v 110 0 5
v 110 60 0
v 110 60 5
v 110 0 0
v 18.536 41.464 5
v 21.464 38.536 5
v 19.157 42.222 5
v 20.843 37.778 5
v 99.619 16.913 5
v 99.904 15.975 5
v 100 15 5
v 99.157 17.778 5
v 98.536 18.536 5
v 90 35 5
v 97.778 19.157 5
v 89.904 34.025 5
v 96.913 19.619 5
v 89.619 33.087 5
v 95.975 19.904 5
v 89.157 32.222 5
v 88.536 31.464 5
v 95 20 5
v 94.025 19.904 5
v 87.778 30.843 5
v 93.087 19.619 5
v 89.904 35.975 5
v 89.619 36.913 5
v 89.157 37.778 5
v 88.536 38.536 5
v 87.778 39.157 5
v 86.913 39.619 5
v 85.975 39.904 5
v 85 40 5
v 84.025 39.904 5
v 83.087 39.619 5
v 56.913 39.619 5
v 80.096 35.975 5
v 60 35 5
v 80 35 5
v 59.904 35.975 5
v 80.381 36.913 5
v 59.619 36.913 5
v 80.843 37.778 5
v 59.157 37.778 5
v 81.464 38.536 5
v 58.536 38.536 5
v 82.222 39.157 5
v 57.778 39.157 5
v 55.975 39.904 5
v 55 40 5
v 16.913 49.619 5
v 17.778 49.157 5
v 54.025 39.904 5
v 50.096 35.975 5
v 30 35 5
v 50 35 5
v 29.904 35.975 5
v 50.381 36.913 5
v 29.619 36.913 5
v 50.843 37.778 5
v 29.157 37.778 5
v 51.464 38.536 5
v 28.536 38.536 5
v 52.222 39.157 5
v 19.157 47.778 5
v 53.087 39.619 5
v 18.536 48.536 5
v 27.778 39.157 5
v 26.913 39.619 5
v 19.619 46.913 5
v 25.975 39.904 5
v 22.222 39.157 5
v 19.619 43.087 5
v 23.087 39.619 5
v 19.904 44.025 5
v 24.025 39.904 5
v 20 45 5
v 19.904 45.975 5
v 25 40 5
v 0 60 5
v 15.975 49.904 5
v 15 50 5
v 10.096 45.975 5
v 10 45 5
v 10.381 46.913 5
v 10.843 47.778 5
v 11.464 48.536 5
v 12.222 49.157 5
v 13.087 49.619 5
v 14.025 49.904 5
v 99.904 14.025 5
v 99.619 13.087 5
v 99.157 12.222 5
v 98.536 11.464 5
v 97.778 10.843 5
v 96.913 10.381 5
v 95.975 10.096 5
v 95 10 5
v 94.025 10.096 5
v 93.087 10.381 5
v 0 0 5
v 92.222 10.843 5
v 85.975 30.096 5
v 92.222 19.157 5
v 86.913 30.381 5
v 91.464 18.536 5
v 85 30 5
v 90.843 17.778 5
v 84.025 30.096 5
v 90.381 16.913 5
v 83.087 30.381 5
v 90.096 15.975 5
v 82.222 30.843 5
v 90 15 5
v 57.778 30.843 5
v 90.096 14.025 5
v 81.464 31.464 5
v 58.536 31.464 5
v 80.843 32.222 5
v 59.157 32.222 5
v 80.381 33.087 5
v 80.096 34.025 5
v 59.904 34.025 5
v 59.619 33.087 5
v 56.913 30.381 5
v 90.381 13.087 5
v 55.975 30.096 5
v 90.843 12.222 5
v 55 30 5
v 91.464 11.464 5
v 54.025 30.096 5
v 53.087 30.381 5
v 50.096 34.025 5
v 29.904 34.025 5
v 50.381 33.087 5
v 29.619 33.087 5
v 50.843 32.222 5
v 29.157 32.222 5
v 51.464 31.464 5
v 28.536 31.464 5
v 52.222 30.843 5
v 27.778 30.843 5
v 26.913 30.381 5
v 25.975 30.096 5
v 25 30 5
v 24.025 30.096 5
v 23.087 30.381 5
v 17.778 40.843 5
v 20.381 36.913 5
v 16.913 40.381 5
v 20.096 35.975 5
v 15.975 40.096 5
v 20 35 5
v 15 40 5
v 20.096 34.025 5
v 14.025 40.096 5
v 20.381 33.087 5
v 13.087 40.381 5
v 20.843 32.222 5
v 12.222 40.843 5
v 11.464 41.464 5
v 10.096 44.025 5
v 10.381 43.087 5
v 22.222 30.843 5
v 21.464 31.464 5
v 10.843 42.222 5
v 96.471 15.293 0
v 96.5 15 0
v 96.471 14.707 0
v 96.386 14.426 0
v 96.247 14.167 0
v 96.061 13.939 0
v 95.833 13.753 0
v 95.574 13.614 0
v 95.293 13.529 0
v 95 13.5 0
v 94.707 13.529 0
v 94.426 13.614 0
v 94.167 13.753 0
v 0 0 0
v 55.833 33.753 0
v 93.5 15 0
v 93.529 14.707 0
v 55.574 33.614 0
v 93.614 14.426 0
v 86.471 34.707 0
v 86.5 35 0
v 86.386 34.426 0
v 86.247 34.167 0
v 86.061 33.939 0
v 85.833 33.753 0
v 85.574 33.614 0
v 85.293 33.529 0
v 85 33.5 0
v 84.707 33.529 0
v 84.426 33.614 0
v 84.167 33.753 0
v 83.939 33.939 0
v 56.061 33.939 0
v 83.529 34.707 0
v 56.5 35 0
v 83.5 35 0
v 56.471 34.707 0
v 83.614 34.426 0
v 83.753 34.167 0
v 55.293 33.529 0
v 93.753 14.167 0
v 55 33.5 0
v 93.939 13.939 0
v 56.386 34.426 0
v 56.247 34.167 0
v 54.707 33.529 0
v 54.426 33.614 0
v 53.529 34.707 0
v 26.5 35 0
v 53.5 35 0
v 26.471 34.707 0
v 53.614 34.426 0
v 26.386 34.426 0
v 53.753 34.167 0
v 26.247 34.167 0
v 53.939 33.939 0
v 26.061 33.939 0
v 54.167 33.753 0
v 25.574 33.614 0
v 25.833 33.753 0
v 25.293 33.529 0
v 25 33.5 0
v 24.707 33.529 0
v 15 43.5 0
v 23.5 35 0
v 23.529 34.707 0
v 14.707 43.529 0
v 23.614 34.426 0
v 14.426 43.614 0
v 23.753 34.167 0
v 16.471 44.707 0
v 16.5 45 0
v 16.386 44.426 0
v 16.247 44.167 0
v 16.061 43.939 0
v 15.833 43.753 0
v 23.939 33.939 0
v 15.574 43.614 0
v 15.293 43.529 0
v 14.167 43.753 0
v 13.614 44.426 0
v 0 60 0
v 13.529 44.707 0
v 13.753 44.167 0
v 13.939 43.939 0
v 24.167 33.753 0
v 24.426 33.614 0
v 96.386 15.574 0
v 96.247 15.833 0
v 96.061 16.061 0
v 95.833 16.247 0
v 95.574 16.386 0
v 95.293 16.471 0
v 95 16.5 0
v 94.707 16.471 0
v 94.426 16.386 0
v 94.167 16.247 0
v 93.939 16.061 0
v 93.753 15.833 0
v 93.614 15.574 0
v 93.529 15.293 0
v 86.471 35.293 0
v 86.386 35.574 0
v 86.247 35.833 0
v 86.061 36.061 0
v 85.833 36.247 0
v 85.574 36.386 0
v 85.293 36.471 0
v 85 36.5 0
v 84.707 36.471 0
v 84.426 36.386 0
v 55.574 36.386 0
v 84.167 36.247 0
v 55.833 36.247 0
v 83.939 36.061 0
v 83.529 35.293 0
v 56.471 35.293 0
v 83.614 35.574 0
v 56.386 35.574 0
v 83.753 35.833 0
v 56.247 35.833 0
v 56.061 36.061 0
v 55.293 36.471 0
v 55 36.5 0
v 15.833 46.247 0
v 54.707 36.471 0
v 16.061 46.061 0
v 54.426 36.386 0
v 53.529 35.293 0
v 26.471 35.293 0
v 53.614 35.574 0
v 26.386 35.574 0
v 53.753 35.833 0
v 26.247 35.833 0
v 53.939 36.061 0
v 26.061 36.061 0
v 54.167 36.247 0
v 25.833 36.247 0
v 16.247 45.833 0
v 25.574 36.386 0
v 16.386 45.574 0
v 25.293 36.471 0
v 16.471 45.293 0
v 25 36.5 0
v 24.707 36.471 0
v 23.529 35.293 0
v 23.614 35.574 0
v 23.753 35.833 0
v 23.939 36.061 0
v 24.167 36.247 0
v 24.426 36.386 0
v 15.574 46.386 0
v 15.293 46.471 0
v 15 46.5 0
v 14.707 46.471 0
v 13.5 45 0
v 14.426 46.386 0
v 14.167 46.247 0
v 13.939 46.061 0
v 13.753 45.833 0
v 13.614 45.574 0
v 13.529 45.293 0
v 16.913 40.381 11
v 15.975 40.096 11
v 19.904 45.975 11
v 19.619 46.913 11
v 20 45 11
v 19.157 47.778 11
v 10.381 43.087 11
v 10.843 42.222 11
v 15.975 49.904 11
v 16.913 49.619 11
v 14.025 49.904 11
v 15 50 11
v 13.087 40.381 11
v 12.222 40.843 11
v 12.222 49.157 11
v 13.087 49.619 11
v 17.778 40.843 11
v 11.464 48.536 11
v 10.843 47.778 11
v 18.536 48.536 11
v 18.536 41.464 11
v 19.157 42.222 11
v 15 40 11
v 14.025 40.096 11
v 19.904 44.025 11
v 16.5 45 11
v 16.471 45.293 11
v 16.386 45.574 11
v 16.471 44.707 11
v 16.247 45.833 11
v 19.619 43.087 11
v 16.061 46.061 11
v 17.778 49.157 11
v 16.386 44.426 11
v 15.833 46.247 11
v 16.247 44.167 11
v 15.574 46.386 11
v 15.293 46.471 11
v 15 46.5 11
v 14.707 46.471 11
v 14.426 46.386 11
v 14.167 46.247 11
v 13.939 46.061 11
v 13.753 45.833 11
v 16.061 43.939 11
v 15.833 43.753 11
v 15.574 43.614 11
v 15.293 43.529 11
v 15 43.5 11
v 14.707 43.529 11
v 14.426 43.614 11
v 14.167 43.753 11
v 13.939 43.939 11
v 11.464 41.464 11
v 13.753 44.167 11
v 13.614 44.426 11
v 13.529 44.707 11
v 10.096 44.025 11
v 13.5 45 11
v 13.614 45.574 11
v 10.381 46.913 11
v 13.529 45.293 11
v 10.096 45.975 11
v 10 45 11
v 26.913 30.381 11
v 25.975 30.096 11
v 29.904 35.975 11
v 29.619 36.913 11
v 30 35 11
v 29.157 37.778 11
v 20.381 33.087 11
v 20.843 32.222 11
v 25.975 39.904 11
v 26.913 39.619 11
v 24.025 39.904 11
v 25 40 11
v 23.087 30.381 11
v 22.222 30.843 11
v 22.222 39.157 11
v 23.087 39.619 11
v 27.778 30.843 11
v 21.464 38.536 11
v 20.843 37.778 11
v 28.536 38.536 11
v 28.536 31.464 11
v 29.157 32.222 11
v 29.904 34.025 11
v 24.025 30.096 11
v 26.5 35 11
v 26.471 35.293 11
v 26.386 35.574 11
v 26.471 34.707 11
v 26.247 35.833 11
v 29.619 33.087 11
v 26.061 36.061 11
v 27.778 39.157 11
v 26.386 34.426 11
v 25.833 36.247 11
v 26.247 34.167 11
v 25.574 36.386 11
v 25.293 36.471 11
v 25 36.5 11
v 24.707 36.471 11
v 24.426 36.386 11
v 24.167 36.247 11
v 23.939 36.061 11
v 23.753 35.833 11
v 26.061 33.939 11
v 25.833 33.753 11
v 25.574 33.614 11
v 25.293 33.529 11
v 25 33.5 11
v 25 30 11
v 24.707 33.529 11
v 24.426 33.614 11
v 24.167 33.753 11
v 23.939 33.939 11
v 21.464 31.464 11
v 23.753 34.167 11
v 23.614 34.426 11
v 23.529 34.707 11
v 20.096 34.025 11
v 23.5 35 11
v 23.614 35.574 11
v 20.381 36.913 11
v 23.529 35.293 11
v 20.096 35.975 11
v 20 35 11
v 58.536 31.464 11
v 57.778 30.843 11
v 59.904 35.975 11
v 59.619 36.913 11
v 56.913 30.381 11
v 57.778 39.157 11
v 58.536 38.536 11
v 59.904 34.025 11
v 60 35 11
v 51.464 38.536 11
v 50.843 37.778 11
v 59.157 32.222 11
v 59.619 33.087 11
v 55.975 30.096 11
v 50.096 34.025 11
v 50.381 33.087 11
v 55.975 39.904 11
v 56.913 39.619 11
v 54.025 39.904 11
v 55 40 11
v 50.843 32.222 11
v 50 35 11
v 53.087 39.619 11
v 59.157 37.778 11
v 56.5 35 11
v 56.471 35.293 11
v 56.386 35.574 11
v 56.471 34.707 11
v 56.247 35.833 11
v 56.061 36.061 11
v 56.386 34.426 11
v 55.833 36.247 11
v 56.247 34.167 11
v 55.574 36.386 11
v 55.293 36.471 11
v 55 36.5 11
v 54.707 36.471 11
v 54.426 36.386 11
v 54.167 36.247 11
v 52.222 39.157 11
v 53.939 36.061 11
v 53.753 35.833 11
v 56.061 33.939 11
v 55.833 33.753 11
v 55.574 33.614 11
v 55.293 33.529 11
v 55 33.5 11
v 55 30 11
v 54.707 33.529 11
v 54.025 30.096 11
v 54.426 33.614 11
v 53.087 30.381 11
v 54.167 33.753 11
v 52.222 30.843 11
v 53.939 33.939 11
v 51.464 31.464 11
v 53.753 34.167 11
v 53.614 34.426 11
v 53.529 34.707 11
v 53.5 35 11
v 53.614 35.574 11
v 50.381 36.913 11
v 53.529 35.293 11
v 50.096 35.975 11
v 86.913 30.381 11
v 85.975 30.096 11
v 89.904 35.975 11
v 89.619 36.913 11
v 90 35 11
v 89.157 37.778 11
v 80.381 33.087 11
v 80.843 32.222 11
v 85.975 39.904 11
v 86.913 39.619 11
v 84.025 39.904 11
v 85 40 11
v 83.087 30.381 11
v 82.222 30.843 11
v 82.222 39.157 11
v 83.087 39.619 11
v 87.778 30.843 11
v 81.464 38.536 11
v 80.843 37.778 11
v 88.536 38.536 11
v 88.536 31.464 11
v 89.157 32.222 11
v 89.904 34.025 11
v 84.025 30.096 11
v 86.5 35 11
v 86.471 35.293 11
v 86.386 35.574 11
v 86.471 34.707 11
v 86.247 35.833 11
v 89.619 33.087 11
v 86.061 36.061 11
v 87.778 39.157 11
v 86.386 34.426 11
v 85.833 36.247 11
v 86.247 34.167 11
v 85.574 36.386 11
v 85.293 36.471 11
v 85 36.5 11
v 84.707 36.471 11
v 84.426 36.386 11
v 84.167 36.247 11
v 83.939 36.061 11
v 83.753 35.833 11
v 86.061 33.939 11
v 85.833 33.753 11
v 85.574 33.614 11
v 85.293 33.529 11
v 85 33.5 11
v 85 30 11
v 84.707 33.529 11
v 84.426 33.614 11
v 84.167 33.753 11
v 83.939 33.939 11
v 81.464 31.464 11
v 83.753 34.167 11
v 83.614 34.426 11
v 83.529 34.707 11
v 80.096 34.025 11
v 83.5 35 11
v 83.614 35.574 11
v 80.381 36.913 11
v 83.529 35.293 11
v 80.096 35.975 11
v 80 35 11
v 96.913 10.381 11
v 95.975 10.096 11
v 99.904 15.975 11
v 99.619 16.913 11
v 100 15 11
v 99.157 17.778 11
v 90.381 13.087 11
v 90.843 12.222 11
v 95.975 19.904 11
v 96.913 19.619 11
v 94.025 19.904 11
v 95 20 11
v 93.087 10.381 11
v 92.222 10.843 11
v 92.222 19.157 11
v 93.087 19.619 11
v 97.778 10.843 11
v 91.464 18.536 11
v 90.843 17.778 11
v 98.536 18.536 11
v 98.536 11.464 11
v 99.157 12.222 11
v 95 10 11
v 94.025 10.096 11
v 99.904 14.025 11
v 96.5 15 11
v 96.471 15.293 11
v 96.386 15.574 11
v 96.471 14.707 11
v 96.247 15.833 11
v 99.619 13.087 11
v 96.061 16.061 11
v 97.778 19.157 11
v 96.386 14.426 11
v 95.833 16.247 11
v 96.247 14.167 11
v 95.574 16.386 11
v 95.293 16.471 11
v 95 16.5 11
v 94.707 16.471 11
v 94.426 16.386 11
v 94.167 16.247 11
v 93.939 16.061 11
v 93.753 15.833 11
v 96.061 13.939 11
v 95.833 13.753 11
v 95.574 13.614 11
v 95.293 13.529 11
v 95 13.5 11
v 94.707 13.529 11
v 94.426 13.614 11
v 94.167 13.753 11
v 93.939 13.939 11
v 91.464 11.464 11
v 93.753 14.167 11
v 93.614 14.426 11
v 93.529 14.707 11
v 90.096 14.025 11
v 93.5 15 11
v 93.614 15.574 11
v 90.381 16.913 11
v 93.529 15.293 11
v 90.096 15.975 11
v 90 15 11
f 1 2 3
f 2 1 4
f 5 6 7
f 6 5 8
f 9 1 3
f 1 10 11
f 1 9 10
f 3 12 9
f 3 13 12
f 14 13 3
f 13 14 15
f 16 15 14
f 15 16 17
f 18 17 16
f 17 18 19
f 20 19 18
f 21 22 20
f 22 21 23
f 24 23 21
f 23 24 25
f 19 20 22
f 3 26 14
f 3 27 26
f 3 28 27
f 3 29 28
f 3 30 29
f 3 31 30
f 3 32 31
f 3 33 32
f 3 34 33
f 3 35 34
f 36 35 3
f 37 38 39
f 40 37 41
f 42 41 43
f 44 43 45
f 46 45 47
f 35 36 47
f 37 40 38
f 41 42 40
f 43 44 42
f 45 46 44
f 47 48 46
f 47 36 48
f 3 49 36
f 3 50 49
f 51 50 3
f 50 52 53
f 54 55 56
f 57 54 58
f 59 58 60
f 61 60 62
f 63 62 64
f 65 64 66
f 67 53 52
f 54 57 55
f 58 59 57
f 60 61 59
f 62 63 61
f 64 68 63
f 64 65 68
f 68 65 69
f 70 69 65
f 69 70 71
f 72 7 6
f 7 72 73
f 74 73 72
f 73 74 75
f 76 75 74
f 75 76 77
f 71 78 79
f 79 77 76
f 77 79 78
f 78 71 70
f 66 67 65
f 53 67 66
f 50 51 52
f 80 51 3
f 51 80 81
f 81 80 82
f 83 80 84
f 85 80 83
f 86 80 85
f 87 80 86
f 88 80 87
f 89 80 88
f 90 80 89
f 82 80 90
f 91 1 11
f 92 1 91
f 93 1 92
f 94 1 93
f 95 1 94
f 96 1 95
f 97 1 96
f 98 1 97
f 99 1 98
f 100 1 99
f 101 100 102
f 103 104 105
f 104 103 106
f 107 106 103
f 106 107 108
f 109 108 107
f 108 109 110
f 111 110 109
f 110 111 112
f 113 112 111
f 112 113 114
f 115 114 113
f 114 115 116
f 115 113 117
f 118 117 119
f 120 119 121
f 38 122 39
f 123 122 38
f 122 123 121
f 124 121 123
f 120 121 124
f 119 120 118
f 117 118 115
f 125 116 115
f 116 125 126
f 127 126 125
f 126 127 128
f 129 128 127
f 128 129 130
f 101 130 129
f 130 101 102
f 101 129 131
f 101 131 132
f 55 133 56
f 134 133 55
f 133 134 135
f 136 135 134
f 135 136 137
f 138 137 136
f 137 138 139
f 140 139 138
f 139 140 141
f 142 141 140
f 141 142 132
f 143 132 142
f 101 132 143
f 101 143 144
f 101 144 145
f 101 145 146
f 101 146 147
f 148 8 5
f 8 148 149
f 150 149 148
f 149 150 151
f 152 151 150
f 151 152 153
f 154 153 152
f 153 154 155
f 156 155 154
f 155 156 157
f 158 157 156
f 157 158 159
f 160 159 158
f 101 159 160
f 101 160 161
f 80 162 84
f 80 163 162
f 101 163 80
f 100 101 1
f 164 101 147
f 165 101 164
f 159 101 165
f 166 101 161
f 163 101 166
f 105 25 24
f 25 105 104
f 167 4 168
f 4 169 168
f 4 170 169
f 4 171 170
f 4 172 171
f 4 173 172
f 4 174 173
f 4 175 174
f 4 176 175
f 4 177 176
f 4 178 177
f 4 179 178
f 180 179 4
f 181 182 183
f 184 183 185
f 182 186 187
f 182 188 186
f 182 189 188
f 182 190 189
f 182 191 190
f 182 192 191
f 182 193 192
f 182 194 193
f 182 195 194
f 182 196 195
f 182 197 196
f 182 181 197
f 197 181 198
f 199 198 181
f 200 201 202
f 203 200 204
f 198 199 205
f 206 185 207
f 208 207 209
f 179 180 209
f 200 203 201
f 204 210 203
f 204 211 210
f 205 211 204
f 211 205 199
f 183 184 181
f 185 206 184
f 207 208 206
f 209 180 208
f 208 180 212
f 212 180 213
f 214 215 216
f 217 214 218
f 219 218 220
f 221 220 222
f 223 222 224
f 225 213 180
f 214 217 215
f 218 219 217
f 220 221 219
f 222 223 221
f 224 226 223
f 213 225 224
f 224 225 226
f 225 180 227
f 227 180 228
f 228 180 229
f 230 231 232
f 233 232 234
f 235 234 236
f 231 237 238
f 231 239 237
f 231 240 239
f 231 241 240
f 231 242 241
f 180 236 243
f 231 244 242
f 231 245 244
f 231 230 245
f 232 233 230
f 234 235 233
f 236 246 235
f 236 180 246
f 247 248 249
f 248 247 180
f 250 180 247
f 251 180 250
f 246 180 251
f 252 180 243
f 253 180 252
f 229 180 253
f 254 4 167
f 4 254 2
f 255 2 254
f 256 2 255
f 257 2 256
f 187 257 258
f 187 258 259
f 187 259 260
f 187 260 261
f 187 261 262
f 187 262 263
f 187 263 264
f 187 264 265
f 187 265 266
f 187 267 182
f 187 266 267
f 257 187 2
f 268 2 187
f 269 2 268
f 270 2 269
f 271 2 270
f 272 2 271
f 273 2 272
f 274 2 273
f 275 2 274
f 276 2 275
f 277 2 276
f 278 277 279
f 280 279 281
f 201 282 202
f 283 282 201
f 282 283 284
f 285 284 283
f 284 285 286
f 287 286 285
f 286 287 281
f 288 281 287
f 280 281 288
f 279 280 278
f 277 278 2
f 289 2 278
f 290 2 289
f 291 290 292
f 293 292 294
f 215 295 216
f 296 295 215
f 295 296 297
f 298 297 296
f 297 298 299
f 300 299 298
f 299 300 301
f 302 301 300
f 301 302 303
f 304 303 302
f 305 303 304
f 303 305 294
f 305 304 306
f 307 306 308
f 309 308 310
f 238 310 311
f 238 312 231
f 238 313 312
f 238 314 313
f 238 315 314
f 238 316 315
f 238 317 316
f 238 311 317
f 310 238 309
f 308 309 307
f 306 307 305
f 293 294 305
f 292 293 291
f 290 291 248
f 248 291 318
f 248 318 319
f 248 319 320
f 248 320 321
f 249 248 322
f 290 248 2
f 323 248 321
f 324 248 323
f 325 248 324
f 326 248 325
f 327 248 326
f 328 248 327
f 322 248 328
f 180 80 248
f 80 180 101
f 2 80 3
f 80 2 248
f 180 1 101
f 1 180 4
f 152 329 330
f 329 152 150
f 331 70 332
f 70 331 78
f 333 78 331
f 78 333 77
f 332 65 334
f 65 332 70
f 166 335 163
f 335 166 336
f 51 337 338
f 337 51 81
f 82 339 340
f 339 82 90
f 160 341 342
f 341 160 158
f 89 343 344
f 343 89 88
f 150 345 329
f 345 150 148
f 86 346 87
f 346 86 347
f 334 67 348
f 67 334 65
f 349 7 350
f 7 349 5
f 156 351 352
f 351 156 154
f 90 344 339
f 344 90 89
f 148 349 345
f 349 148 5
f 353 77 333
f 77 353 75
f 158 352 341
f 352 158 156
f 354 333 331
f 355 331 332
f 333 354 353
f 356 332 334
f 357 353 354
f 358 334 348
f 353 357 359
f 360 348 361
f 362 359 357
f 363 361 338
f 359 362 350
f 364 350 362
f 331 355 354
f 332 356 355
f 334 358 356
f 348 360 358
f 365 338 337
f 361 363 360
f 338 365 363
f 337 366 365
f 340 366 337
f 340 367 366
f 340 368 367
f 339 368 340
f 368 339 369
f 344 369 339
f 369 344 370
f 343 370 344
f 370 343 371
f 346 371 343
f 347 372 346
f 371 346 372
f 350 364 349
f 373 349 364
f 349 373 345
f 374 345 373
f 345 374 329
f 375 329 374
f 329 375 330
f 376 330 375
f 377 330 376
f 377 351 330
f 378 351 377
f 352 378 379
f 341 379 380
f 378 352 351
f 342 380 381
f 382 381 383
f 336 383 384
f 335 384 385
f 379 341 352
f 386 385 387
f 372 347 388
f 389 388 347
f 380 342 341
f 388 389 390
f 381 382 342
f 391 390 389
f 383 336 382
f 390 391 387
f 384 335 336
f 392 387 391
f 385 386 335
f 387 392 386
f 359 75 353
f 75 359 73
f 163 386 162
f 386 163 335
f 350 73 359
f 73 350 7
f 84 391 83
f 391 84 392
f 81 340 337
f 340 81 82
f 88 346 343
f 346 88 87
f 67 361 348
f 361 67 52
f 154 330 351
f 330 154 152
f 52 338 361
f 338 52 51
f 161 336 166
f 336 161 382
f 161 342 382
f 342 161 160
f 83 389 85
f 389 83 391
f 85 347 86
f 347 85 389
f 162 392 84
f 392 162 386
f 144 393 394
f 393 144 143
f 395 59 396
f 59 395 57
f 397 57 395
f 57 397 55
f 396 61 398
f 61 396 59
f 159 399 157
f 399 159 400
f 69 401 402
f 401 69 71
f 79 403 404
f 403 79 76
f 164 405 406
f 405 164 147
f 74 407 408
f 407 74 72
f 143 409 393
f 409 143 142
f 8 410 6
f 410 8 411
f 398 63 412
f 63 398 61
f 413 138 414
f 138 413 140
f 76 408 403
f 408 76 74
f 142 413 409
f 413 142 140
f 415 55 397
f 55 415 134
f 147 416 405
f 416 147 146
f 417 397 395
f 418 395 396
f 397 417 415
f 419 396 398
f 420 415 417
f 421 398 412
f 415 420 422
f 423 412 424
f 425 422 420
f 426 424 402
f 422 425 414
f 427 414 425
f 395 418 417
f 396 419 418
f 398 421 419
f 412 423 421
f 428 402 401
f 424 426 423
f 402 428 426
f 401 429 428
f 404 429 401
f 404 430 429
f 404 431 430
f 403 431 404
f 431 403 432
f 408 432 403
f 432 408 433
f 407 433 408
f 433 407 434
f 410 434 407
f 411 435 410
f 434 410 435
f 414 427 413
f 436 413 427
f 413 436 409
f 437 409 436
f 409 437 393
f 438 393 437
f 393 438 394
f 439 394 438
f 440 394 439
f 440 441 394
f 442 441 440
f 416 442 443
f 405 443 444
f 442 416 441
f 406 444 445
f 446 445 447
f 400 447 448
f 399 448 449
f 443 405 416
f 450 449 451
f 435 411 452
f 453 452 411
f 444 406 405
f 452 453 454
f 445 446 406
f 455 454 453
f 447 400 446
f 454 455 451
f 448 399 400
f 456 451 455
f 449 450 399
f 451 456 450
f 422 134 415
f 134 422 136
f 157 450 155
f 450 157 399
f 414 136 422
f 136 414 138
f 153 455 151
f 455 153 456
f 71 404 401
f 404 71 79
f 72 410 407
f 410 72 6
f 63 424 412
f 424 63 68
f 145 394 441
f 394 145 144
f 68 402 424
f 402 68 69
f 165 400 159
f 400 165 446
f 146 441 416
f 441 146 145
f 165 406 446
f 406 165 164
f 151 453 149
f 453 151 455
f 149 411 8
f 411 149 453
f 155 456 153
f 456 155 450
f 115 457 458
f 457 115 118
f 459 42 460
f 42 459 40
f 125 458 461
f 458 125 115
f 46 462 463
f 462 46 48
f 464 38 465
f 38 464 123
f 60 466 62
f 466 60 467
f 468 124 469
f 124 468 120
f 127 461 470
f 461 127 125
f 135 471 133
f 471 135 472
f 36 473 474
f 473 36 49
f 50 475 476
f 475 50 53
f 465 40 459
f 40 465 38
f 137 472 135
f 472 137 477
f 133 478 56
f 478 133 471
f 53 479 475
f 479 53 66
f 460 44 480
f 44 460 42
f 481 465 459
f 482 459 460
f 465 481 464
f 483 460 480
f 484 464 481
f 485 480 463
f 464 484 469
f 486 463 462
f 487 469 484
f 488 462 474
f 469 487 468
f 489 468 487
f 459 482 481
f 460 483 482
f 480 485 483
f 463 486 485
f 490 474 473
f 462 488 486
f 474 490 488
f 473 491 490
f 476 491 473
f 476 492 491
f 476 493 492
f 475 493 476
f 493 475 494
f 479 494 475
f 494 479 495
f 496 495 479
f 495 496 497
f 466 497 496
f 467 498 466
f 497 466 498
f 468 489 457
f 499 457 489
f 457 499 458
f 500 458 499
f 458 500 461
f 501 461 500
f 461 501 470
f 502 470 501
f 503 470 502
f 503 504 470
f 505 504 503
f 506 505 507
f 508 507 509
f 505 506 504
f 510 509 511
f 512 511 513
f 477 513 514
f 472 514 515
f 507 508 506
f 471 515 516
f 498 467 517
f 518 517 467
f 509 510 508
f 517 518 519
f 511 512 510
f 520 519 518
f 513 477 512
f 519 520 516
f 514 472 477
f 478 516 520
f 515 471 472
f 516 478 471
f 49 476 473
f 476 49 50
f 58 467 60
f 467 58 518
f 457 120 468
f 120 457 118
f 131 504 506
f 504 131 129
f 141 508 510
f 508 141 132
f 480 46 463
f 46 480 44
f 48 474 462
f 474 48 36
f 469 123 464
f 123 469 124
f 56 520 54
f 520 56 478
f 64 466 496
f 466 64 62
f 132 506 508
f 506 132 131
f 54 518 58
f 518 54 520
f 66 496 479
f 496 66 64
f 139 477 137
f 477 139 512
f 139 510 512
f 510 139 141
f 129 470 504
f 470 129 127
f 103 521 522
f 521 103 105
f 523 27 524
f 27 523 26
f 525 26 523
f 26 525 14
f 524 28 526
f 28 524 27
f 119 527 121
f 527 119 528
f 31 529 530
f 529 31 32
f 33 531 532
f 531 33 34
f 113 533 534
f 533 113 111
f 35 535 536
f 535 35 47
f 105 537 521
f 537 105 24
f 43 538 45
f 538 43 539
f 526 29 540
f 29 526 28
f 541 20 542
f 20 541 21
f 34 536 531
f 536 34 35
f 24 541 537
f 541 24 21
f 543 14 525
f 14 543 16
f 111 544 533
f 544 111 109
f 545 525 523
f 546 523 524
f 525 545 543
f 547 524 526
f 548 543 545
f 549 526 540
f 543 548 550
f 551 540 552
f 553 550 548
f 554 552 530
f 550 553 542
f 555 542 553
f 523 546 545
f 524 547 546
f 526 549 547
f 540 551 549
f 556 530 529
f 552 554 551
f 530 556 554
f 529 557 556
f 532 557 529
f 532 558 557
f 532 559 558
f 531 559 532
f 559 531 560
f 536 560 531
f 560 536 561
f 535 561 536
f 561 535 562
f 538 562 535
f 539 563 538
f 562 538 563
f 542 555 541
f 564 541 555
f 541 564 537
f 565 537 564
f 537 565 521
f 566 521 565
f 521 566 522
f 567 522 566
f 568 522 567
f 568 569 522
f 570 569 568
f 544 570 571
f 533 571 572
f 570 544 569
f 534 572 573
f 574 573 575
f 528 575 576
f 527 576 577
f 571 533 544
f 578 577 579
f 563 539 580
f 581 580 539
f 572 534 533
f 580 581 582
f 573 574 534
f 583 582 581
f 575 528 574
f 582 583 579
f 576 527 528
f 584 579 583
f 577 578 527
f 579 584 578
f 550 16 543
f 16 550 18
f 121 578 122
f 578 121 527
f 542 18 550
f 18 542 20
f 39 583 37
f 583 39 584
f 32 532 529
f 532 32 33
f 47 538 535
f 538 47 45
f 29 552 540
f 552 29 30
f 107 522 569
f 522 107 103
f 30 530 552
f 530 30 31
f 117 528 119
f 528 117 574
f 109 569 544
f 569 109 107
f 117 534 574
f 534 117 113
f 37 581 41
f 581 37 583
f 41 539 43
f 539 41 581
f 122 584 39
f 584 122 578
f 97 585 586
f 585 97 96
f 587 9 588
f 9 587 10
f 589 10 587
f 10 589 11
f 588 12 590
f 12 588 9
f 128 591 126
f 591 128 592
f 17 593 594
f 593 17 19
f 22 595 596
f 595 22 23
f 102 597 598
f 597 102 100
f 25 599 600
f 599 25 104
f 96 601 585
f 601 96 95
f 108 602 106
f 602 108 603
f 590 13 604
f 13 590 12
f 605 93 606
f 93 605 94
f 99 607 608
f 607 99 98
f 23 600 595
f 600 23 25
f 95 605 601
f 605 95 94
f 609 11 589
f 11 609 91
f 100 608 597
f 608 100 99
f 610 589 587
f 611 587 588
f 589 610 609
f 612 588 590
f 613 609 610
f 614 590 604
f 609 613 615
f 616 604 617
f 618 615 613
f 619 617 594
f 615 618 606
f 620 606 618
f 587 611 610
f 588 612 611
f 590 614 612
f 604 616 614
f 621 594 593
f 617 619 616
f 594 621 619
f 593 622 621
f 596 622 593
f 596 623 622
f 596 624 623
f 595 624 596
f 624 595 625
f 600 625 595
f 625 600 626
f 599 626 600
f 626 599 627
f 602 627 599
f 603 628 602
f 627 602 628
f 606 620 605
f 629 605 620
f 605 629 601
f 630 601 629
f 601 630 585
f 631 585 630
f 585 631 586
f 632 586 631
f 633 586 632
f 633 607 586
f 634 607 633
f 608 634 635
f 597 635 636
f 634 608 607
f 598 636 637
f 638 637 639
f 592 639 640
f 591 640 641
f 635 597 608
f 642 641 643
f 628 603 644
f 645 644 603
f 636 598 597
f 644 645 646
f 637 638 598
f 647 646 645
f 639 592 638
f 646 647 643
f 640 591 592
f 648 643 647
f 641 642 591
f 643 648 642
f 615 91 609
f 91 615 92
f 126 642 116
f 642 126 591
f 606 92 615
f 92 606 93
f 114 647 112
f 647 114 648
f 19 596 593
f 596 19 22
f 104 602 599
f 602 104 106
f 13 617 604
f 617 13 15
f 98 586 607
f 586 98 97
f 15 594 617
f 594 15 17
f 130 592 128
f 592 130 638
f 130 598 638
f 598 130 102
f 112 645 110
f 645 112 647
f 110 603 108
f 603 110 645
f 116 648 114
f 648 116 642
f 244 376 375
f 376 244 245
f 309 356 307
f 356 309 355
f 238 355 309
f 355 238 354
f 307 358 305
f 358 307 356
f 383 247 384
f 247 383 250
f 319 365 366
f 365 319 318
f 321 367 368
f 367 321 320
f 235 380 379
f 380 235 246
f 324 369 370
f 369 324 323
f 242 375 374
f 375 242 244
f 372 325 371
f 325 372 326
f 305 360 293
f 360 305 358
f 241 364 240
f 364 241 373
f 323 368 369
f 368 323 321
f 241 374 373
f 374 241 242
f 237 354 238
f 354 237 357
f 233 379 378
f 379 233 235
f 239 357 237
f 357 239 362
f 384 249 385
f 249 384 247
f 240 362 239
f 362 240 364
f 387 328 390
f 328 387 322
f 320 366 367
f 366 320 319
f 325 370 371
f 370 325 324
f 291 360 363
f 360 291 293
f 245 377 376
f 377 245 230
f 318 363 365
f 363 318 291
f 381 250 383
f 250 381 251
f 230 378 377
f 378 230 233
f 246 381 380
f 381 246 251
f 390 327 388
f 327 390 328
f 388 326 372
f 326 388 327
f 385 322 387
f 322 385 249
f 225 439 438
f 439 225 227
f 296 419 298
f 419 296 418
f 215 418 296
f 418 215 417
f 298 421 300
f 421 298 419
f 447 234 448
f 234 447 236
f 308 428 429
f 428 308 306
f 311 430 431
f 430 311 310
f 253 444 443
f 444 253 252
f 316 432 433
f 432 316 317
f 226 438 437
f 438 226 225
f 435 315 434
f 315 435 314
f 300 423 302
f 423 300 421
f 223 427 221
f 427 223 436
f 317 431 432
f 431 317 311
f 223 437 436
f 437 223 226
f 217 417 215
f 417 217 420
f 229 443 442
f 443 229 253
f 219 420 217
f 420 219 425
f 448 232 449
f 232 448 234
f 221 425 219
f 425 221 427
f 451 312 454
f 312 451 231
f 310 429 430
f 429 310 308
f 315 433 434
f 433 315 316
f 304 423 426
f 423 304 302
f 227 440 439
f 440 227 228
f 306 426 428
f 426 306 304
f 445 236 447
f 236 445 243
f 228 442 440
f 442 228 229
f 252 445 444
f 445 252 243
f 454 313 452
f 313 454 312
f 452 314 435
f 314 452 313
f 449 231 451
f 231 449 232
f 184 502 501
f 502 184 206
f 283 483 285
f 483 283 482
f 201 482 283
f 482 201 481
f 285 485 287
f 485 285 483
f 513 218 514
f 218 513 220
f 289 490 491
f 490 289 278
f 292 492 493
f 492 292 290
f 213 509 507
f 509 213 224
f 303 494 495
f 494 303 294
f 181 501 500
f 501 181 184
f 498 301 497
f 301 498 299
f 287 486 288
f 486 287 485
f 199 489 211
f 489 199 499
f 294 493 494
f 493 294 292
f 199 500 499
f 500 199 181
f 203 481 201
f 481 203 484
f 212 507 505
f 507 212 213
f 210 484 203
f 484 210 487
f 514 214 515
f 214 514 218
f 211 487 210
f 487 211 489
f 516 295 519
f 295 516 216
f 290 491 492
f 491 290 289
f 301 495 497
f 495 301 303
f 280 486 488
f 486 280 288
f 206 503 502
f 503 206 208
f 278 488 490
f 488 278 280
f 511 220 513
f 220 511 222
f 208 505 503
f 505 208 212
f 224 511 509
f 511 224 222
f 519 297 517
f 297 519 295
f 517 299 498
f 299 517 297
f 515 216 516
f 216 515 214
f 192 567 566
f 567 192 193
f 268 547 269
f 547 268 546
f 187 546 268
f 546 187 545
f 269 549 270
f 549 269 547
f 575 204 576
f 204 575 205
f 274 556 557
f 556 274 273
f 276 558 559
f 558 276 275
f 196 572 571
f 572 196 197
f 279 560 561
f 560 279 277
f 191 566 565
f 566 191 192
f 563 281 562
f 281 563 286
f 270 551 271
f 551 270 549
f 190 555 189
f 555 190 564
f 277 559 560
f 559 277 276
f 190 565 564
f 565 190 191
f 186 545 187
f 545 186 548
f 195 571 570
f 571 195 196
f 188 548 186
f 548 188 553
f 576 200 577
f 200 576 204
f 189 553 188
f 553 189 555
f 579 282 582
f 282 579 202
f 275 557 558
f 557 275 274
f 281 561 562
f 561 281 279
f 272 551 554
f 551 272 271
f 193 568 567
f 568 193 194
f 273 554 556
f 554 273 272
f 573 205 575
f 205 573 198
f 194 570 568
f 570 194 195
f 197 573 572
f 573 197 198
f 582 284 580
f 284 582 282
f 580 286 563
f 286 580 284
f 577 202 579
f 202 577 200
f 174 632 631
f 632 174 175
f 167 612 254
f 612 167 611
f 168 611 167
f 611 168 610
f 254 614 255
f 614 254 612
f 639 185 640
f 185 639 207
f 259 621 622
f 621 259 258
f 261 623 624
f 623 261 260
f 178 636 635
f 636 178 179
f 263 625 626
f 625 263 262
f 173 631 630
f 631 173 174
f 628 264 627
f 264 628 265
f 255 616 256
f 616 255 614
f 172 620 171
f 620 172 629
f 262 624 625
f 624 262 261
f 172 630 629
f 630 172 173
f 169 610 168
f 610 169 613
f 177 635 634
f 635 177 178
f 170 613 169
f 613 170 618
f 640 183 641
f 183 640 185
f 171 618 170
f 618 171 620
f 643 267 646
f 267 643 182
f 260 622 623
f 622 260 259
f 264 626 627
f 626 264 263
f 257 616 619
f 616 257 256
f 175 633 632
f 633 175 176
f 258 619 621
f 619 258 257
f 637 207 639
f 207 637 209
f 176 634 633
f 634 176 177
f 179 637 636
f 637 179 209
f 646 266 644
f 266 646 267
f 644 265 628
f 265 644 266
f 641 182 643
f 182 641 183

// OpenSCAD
$fn = 32;

// ----------------------------------------------------------------------
// Boss field: plate with bosses at given coordinates
// ----------------------------------------------------------------------

// --- parameters (mm) ---
plate_l = 110;            // plate length, X
plate_w = 60;             // plate width, Y
plate_t = 5;              // plate thickness, Z
boss_d = 10;              // boss diameter
boss_h = 6;               // boss height above the plate
bore_d = 3;               // boss bore

total_h = plate_t + boss_h;  // overall height

difference() {
  union() {
    cube([plate_l, plate_w, plate_t]);
    translate([15, 45, plate_t]) cylinder(h = boss_h, d = boss_d);
    translate([25, 35, plate_t]) cylinder(h = boss_h, d = boss_d);
    translate([55, 35, plate_t]) cylinder(h = boss_h, d = boss_d);
    translate([85, 35, plate_t]) cylinder(h = boss_h, d = boss_d);
    translate([95, 15, plate_t]) cylinder(h = boss_h, d = boss_d);
  }
  translate([15, 45, -1]) cylinder(h = total_h + 2, d = bore_d);
  translate([25, 35, -1]) cylinder(h = total_h + 2, d = bore_d);
  translate([55, 35, -1]) cylinder(h = total_h + 2, d = bore_d);
  translate([85, 35, -1]) cylinder(h = total_h + 2, d = bore_d);
  translate([95, 15, -1]) cylinder(h = total_h + 2, d = bore_d);
}
